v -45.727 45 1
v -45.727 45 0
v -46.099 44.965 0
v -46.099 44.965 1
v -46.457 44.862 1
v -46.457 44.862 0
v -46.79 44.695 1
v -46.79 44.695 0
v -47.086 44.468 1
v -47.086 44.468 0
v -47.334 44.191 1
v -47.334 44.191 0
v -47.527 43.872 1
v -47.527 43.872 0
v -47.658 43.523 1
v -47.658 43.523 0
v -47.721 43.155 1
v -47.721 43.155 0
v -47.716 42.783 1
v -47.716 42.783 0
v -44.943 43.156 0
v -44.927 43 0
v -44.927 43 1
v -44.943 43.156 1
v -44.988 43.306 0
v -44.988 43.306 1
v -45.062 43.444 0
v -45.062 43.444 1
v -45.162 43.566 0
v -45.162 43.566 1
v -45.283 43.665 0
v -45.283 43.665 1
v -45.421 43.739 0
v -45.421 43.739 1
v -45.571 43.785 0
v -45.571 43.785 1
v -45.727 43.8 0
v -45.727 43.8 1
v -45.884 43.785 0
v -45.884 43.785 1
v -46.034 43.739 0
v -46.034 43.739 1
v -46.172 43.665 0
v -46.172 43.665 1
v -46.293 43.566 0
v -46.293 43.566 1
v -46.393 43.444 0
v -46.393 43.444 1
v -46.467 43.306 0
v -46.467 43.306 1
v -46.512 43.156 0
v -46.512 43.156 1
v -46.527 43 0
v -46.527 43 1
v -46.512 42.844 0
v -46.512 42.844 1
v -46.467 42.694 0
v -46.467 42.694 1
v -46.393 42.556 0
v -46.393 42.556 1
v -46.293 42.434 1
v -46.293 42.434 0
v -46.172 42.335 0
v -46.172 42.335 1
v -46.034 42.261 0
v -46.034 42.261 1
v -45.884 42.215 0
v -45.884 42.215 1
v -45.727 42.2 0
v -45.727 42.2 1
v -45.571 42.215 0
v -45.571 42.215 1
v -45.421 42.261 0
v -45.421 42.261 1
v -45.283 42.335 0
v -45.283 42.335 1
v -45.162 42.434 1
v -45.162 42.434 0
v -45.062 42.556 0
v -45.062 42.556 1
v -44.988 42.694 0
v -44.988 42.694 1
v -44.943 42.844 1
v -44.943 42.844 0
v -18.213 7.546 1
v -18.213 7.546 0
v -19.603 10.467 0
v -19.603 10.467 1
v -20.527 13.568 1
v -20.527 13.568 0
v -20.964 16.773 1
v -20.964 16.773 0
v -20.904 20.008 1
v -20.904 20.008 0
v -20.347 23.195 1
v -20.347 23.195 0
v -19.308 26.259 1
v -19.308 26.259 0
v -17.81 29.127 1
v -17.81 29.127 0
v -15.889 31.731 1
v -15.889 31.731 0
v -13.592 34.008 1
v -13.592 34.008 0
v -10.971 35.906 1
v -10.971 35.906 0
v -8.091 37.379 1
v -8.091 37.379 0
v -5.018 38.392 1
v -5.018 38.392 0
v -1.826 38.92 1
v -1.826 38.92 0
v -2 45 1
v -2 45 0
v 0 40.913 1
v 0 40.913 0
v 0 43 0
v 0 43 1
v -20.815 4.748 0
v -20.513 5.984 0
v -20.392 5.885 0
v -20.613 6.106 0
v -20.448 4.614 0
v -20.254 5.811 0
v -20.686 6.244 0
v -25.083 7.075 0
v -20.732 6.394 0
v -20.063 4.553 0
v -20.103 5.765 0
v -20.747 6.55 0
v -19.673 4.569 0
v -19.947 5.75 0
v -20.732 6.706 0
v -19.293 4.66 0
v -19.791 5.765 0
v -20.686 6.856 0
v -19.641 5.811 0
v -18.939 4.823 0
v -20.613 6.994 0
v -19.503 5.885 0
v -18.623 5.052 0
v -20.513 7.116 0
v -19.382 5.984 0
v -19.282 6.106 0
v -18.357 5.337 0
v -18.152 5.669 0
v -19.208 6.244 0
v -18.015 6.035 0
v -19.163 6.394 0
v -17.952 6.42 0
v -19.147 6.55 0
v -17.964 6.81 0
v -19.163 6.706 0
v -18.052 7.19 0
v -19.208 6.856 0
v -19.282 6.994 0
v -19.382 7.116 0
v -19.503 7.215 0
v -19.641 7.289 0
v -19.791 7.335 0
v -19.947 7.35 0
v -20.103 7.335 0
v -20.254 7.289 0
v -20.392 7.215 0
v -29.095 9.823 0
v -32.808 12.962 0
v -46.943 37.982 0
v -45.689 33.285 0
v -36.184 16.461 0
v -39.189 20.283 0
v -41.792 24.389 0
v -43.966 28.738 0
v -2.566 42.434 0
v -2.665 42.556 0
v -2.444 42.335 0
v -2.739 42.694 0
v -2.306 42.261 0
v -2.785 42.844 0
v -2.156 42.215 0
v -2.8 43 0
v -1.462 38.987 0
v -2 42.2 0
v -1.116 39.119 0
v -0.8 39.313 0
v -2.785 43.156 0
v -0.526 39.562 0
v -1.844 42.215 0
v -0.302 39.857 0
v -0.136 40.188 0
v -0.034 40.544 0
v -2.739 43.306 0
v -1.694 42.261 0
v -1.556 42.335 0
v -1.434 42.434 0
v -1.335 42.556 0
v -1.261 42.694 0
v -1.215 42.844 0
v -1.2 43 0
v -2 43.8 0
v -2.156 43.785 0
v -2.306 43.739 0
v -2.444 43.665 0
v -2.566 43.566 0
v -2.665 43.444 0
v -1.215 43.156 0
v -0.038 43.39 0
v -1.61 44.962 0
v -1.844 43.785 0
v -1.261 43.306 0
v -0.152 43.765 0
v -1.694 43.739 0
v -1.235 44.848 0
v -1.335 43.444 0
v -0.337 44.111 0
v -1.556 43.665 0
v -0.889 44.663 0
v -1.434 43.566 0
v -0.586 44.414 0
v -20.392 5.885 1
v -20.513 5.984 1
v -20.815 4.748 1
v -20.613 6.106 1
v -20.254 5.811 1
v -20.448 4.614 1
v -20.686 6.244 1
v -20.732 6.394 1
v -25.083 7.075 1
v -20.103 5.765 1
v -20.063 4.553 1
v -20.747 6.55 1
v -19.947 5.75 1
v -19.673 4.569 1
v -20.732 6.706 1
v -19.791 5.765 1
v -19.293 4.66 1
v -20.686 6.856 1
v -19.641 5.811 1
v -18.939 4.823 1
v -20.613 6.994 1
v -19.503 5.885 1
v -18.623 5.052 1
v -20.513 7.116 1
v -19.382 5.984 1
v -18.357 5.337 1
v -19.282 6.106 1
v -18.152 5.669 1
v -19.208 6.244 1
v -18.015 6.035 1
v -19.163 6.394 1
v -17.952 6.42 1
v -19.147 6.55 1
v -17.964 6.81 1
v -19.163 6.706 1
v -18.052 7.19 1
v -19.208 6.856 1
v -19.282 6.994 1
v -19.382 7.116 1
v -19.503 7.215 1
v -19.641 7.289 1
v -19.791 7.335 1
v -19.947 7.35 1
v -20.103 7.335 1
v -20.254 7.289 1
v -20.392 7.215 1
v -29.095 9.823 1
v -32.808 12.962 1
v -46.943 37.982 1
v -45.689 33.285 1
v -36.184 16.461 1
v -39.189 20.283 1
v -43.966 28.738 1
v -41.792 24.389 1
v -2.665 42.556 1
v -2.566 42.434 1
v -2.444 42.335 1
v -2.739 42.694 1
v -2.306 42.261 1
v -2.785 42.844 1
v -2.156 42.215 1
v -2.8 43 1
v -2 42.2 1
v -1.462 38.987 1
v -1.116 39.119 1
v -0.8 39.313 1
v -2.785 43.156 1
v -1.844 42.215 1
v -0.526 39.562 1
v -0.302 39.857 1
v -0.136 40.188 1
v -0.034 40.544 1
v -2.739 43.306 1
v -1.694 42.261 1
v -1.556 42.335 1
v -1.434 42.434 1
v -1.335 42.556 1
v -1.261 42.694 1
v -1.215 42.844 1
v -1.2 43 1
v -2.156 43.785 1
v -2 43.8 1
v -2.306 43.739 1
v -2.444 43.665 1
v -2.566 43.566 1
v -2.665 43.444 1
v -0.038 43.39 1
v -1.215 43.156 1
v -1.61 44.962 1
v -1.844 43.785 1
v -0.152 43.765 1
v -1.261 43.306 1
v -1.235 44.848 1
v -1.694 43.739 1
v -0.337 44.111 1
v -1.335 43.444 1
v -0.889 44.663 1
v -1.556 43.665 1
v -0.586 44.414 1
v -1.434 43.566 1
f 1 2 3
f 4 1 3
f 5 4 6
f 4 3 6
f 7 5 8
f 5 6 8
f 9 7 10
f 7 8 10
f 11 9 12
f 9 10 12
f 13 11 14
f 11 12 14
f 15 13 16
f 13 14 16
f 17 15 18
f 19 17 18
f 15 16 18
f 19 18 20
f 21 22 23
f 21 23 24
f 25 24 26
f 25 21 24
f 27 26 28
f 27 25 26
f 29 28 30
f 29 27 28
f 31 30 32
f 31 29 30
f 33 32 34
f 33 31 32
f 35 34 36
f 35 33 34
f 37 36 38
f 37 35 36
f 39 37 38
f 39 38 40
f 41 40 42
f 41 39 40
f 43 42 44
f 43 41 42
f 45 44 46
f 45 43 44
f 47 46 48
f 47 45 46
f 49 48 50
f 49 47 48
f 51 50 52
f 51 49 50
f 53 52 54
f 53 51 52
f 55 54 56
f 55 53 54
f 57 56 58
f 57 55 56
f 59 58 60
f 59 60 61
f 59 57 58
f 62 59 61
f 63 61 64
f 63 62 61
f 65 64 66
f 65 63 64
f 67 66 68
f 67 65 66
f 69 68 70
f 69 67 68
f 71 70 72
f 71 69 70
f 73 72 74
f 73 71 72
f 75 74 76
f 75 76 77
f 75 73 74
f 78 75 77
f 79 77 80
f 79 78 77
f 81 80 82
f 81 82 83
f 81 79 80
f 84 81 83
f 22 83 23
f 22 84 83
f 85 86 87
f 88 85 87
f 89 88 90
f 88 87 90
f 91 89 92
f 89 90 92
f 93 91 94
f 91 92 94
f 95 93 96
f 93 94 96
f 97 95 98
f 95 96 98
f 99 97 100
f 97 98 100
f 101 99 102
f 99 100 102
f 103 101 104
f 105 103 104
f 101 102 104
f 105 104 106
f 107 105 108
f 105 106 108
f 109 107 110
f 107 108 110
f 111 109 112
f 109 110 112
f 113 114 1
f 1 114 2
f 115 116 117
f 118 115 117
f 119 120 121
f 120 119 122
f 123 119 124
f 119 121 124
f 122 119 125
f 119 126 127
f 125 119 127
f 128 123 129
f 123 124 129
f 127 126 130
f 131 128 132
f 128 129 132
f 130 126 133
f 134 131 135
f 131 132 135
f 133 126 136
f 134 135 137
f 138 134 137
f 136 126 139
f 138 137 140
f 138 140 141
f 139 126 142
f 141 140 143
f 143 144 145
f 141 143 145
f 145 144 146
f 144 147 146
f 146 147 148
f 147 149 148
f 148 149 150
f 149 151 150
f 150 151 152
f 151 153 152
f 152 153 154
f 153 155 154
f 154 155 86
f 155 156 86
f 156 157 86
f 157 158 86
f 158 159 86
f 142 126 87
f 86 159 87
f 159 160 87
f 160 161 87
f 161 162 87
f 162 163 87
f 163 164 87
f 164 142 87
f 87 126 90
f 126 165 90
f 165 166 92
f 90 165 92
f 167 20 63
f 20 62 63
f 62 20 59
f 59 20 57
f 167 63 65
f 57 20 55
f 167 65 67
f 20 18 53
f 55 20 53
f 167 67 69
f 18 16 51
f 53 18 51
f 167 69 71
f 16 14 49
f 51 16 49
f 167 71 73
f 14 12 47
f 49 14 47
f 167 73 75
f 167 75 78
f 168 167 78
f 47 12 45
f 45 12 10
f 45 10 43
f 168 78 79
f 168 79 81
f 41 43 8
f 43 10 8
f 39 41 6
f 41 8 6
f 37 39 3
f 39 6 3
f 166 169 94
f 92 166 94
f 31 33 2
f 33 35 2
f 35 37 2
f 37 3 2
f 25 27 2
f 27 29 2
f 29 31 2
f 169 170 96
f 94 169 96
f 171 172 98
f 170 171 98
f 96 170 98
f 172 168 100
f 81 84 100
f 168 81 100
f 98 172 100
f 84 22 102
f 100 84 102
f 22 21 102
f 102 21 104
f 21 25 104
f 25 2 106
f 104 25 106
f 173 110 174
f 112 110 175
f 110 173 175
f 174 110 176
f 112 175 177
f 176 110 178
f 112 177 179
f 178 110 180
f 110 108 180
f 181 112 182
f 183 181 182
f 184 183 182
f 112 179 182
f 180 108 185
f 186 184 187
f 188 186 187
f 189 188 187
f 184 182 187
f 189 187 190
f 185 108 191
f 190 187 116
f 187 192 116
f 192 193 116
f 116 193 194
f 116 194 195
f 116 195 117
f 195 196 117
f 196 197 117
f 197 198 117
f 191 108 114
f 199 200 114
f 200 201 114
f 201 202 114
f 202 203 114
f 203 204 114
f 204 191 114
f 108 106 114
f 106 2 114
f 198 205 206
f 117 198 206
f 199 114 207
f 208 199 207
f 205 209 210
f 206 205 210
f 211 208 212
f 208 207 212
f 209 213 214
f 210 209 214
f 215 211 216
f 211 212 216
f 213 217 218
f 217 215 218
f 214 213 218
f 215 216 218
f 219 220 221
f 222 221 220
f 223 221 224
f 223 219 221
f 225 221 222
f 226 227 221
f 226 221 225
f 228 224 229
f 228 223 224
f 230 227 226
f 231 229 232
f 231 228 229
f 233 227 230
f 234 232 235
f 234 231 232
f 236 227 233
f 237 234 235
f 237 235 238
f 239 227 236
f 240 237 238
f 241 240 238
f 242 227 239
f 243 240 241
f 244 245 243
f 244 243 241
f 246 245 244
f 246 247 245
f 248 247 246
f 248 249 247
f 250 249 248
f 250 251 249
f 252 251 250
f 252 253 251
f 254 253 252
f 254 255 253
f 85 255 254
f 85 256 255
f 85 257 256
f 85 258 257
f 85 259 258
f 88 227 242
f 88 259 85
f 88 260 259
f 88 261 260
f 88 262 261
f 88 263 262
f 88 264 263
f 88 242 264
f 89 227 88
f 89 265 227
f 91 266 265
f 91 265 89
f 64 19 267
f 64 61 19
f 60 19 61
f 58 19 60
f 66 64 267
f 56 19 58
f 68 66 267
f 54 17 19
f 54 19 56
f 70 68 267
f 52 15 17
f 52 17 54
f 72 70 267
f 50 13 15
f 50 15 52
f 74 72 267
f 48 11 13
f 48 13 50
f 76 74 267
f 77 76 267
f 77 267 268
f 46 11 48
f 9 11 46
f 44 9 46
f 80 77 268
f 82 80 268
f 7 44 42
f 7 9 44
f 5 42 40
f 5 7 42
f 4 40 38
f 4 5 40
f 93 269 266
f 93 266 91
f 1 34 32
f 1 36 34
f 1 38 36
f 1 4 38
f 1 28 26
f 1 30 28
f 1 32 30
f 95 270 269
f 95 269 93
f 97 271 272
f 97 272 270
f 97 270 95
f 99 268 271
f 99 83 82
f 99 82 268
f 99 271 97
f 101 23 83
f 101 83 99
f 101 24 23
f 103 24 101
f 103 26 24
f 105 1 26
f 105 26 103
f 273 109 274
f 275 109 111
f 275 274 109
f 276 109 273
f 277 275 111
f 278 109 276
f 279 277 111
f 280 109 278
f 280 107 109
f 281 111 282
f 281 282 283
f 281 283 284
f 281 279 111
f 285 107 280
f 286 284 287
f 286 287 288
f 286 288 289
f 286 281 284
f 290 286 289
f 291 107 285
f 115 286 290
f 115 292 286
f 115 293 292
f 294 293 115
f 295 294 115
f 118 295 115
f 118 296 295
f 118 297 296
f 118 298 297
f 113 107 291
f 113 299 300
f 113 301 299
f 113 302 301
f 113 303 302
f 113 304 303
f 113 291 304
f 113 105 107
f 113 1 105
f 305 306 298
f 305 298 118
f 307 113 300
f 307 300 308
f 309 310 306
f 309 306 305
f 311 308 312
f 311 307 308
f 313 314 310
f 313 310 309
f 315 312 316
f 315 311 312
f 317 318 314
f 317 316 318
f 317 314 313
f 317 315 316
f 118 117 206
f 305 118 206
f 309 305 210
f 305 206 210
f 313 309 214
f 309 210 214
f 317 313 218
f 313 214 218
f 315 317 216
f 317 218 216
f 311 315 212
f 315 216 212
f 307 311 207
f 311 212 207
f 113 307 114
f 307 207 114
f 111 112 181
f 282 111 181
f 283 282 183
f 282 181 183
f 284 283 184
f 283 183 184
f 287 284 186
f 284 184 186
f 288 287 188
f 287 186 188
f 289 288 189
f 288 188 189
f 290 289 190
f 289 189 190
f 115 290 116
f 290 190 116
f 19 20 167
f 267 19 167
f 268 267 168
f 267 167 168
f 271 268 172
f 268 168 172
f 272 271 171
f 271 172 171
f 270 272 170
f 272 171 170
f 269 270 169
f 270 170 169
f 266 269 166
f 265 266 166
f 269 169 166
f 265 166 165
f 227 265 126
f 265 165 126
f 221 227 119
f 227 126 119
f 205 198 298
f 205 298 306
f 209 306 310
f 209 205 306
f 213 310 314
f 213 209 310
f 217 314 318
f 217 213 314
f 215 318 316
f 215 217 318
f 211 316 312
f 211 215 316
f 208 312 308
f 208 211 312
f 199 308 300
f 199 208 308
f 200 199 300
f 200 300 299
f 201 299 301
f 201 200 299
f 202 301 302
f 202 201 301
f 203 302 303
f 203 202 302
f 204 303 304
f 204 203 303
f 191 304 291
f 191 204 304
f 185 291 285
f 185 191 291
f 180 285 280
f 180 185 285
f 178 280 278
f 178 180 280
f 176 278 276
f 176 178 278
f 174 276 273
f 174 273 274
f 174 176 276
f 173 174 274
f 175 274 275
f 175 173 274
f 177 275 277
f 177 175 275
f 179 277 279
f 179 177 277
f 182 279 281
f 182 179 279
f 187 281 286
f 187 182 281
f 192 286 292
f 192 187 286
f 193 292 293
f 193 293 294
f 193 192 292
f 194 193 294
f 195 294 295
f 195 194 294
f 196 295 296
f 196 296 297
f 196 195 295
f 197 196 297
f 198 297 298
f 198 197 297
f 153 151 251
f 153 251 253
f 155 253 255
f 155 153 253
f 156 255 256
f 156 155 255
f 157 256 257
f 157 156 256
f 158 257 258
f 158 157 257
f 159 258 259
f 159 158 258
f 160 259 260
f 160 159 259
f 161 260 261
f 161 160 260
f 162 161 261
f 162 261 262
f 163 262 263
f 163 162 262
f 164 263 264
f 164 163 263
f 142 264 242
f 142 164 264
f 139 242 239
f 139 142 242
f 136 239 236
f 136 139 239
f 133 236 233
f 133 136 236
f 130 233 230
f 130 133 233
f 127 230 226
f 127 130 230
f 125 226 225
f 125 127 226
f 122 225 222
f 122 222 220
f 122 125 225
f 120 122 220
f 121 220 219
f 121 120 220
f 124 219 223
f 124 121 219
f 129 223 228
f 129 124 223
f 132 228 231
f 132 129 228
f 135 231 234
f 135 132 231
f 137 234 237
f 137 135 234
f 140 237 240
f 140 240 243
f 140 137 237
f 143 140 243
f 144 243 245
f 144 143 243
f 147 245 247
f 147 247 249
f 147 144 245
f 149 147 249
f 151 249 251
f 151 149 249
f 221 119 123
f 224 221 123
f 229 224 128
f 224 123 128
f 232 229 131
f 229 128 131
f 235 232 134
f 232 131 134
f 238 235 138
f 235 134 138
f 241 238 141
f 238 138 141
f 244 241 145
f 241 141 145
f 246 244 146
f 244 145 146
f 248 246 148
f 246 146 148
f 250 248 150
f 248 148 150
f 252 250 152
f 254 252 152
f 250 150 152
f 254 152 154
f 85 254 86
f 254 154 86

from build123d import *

# Parameters (mm, degrees)
SKETCH_1_R      = 0.8
EXTRUDE_1_DEPTH = 1


with BuildPart() as part:
    # Эскиз1 → Бобышка-Вытянуть1 (new body)
    with BuildSketch(Plane.XY):
        with BuildLine():
            Line((0, 40.912878475), (0, 43))
            ThreePointArc((0, 43), (-0.585786438, 44.414213562), (-2, 45))
            Line((-2, 45), (-45.727453461, 45))
            ThreePointArc((-45.727453461, 45), (-47.216544225, 44.335143699), (-47.715603611, 42.782608696))
            ThreePointArc((-47.715603611, 42.782608696), (-39.188772883, 20.282855848), (-20.814645128, 4.747826087))
            ThreePointArc((-20.814645128, 4.747826087), (-18.482786396, 5.188016153), (-18.212814487, 7.545652174))
            ThreePointArc((-18.212814487, 7.545652174), (-18.614079194, 27.721936832), (-1.826086957, 38.92045426))
            ThreePointArc((-1.826086957, 38.92045426), (-0.525580438, 39.561550625), (0, 40.912878475))
        make_face()
        with Locations((-19.947368247, 6.55)):
            Circle(SKETCH_1_R, mode=Mode.SUBTRACT)
        with Locations((-45.727453461, 43)):
            Circle(SKETCH_1_R, mode=Mode.SUBTRACT)
        with Locations((-2, 43)):
            Circle(SKETCH_1_R, mode=Mode.SUBTRACT)
    extrude(amount=EXTRUDE_1_DEPTH)


solid = part.part
